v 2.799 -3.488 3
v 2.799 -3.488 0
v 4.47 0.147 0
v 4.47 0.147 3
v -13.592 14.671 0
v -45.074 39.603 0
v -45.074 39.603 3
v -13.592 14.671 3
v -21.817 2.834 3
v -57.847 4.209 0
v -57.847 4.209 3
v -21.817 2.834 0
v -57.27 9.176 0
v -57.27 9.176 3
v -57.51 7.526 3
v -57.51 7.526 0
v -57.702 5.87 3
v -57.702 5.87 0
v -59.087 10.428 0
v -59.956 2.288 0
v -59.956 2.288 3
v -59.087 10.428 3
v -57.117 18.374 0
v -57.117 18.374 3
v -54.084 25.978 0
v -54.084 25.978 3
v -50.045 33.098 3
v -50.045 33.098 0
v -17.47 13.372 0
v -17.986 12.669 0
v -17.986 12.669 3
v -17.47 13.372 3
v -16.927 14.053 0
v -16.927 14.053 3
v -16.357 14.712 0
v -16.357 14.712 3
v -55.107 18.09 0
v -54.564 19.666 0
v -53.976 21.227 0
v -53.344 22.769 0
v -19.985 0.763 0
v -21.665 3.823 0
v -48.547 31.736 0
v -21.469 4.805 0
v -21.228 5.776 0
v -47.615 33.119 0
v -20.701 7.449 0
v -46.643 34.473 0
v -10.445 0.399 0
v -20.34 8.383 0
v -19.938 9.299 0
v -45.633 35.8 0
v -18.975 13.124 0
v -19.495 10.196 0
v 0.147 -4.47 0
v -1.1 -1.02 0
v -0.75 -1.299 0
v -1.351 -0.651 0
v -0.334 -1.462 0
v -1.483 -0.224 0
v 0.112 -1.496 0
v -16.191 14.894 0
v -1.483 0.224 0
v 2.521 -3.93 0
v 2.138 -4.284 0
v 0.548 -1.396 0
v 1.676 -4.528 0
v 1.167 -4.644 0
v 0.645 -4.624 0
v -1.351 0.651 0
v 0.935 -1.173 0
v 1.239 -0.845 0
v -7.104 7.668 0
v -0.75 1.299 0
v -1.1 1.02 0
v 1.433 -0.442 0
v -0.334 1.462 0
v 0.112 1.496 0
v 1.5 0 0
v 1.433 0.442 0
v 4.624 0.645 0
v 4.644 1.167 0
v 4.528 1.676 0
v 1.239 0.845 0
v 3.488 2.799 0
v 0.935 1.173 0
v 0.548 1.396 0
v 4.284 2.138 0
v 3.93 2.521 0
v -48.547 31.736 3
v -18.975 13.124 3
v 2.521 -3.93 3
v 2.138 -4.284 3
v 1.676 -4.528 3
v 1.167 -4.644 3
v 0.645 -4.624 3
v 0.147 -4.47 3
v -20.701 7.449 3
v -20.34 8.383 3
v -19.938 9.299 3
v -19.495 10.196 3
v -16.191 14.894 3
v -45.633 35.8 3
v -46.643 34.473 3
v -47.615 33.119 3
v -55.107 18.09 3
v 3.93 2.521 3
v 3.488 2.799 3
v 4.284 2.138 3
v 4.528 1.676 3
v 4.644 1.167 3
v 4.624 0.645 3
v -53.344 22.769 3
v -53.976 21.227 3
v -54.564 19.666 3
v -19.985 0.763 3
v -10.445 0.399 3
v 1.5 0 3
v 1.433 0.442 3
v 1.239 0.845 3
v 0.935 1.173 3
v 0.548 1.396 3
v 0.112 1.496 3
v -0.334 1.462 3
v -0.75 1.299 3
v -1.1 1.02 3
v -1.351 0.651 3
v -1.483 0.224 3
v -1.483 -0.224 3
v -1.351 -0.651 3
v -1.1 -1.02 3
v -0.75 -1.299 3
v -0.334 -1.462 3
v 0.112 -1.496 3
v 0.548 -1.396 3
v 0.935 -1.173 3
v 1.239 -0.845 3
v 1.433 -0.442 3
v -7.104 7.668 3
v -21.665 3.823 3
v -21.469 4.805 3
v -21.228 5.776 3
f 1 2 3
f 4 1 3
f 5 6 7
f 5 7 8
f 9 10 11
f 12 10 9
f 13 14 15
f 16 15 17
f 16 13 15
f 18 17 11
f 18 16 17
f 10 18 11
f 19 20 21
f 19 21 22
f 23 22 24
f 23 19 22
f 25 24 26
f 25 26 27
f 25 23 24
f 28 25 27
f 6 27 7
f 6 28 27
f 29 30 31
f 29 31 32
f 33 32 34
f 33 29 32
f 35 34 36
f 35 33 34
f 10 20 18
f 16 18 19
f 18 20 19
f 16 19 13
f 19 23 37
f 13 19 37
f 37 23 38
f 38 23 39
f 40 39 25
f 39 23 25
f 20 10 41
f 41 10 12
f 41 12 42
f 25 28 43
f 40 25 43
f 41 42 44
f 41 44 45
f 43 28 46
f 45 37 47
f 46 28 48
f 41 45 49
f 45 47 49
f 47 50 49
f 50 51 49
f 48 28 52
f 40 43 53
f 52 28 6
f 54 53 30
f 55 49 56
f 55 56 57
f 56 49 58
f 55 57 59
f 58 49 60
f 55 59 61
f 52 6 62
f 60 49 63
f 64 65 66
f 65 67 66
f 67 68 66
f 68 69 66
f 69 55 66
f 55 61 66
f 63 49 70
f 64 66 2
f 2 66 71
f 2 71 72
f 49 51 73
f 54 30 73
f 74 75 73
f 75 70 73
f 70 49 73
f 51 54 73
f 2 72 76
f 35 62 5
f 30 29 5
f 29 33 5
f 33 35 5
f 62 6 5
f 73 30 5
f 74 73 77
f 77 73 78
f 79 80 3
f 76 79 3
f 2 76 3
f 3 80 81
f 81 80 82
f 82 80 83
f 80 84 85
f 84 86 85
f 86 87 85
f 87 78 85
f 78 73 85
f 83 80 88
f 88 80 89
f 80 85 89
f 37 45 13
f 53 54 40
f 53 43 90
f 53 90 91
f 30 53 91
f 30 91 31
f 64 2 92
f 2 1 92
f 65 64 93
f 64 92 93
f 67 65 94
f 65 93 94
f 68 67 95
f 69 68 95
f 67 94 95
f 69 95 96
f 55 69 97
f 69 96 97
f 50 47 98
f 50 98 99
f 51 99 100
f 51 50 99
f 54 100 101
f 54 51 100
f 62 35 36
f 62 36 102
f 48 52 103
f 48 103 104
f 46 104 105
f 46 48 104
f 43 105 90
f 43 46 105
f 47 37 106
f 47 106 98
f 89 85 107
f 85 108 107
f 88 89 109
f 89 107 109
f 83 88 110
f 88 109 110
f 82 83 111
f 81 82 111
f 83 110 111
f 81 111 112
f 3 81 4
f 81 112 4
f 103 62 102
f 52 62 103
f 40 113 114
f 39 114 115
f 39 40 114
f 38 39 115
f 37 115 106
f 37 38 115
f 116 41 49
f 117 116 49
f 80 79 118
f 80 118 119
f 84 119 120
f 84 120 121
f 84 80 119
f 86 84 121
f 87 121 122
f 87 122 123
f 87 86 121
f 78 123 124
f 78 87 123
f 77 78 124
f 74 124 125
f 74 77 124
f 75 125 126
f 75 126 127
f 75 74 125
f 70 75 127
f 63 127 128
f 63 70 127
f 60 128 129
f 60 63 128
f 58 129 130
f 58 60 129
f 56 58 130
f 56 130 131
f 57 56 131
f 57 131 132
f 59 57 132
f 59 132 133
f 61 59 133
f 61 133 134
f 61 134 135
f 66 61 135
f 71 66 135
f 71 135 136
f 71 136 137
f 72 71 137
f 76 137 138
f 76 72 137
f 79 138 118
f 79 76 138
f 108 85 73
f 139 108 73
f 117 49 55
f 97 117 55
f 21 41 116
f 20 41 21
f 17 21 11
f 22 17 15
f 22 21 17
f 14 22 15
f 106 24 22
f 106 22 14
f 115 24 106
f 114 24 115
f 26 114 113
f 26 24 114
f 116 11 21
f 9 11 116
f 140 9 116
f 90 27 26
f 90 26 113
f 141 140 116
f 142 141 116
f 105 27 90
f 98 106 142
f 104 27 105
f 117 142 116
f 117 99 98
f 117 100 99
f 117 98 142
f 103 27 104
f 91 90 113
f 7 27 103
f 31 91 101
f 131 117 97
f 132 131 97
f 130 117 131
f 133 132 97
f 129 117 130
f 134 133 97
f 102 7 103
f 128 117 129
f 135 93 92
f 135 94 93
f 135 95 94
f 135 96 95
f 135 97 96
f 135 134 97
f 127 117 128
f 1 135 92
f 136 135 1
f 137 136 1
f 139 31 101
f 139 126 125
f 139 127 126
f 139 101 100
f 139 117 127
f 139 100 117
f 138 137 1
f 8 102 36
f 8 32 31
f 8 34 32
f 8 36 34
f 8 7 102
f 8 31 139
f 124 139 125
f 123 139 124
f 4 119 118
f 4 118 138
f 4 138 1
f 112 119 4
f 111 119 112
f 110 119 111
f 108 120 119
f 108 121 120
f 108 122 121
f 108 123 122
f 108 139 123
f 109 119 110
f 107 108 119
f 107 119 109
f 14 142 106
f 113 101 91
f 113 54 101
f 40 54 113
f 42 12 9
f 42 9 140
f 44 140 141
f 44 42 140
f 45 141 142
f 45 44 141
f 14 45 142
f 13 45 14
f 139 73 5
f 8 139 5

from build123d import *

# Parameters (mm, degrees)
BOSS_EXTRUDE2_DEPTH = 3
CUT_EXTRUDE1_DEPTH  = 72.917502797
SKETCH1_8_R         = 1.5
BOSS_EXTRUDE5_DEPTH = 3
FILLET1_R           = 2


with BuildPart() as part:
    # Sketch1 → Boss-Extrude2 (new body)
    with BuildSketch(Plane.XY):
        with BuildLine():
            Line((-19.985447982, 0.762803358), (-59.956343946, 2.288410074))
            ThreePointArc((-59.956343946, 2.288410074), (-55.730717245, 22.228071336), (-45.073672701, 39.602576043))
            Line((-45.073672701, 39.602576043), (-13.592462366, 14.67122922))
            ThreePointArc((-13.592462366, 14.67122922), (-18.172234131, 8.352838241), (-19.985447982, 0.762803358))
        make_face()
    extrude(amount=BOSS_EXTRUDE2_DEPTH)

    # Sketch1<5> → Cut-Extrude1 (cut, through all)
    with BuildSketch(Plane.XY):
        with BuildLine():
            ThreePointArc((-21.816681027, 2.834154011), (-21.572673921, 4.315059664), (-21.2282638, 5.775882272))
            Line((-21.2282638, 5.775882272), (-57.269563461, 9.175897829))
            ThreePointArc((-57.269563461, 9.175897829), (-57.611850796, 6.698854216), (-57.847050894, 4.209358967))
            Line((-57.847050894, 4.209358967), (-21.816681027, 2.834154011))
        make_face()
        with BuildLine():
            Line((-18.974652115, 13.123988942), (-17.985708937, 12.669422798))
            ThreePointArc((-17.985708937, 12.669422798), (-17.201666988, 13.715052053), (-16.356919422, 14.712280144))
            Line((-16.356919422, 14.712280144), (-16.19149009, 14.894148135))
            Line((-16.19149009, 14.894148135), (-45.633154018, 35.799654388))
            ThreePointArc((-45.633154018, 35.799654388), (-47.133831778, 33.799436415), (-48.546898537, 31.736393028))
            Line((-48.546898537, 31.736393028), (-18.974652115, 13.123988942))
        make_face()
        with BuildLine():
            Line((-55.106686022, 18.090139737), (-20.700540486, 7.449001516))
            ThreePointArc((-20.700540486, 7.449001516), (-20.144482043, 8.843067523), (-19.494667642, 10.19597634))
            Line((-19.494667642, 10.19597634), (-53.343874365, 22.769081398))
            ThreePointArc((-53.343874365, 22.769081398), (-54.275723264, 20.448615214), (-55.106686022, 18.090139737))
        make_face()
    extrude(amount=CUT_EXTRUDE1_DEPTH, mode=Mode.SUBTRACT)

    # Sketch1<8> → Boss-Extrude5 (add)
    with BuildSketch(Plane.XY):
        with BuildLine():
            ThreePointArc((-19.475648091, 4.549629811), (-19.821189154, 2.668419106), (-19.985447982, 0.762803358))
            Line((-19.985447982, 0.762803358), (-10.444898468, 0.398660247))
            Line((-10.444898468, 0.398660247), (1.963879178, -5.305014474))
            Line((1.963879178, -5.305014474), (5.305014474, 1.963879178))
            Line((5.305014474, 1.963879178), (-7.103763171, 7.667553899))
            Line((-7.103763171, 7.667553899), (-13.592462366, 14.67122922))
            ThreePointArc((-13.592462366, 14.67122922), (-14.931769674, 13.305722619), (-16.134512795, 11.818523464))
            ThreePointArc((-16.134512795, 11.818523464), (-18.172234131, 8.352838241), (-19.475648091, 4.549629811))
        make_face()
        Circle(SKETCH1_8_R, mode=Mode.SUBTRACT)
    extrude(amount=BOSS_EXTRUDE5_DEPTH)

    # Fillet1
    fillet1_edges = [part.edges().sort_by_distance(p)[0] for p in [
        (5.305014474, 1.963879178, 1.5),
        (1.963879178, -5.305014474, 1.5),
    ]]
    fillet(fillet1_edges, radius=FILLET1_R)


solid = part.part
